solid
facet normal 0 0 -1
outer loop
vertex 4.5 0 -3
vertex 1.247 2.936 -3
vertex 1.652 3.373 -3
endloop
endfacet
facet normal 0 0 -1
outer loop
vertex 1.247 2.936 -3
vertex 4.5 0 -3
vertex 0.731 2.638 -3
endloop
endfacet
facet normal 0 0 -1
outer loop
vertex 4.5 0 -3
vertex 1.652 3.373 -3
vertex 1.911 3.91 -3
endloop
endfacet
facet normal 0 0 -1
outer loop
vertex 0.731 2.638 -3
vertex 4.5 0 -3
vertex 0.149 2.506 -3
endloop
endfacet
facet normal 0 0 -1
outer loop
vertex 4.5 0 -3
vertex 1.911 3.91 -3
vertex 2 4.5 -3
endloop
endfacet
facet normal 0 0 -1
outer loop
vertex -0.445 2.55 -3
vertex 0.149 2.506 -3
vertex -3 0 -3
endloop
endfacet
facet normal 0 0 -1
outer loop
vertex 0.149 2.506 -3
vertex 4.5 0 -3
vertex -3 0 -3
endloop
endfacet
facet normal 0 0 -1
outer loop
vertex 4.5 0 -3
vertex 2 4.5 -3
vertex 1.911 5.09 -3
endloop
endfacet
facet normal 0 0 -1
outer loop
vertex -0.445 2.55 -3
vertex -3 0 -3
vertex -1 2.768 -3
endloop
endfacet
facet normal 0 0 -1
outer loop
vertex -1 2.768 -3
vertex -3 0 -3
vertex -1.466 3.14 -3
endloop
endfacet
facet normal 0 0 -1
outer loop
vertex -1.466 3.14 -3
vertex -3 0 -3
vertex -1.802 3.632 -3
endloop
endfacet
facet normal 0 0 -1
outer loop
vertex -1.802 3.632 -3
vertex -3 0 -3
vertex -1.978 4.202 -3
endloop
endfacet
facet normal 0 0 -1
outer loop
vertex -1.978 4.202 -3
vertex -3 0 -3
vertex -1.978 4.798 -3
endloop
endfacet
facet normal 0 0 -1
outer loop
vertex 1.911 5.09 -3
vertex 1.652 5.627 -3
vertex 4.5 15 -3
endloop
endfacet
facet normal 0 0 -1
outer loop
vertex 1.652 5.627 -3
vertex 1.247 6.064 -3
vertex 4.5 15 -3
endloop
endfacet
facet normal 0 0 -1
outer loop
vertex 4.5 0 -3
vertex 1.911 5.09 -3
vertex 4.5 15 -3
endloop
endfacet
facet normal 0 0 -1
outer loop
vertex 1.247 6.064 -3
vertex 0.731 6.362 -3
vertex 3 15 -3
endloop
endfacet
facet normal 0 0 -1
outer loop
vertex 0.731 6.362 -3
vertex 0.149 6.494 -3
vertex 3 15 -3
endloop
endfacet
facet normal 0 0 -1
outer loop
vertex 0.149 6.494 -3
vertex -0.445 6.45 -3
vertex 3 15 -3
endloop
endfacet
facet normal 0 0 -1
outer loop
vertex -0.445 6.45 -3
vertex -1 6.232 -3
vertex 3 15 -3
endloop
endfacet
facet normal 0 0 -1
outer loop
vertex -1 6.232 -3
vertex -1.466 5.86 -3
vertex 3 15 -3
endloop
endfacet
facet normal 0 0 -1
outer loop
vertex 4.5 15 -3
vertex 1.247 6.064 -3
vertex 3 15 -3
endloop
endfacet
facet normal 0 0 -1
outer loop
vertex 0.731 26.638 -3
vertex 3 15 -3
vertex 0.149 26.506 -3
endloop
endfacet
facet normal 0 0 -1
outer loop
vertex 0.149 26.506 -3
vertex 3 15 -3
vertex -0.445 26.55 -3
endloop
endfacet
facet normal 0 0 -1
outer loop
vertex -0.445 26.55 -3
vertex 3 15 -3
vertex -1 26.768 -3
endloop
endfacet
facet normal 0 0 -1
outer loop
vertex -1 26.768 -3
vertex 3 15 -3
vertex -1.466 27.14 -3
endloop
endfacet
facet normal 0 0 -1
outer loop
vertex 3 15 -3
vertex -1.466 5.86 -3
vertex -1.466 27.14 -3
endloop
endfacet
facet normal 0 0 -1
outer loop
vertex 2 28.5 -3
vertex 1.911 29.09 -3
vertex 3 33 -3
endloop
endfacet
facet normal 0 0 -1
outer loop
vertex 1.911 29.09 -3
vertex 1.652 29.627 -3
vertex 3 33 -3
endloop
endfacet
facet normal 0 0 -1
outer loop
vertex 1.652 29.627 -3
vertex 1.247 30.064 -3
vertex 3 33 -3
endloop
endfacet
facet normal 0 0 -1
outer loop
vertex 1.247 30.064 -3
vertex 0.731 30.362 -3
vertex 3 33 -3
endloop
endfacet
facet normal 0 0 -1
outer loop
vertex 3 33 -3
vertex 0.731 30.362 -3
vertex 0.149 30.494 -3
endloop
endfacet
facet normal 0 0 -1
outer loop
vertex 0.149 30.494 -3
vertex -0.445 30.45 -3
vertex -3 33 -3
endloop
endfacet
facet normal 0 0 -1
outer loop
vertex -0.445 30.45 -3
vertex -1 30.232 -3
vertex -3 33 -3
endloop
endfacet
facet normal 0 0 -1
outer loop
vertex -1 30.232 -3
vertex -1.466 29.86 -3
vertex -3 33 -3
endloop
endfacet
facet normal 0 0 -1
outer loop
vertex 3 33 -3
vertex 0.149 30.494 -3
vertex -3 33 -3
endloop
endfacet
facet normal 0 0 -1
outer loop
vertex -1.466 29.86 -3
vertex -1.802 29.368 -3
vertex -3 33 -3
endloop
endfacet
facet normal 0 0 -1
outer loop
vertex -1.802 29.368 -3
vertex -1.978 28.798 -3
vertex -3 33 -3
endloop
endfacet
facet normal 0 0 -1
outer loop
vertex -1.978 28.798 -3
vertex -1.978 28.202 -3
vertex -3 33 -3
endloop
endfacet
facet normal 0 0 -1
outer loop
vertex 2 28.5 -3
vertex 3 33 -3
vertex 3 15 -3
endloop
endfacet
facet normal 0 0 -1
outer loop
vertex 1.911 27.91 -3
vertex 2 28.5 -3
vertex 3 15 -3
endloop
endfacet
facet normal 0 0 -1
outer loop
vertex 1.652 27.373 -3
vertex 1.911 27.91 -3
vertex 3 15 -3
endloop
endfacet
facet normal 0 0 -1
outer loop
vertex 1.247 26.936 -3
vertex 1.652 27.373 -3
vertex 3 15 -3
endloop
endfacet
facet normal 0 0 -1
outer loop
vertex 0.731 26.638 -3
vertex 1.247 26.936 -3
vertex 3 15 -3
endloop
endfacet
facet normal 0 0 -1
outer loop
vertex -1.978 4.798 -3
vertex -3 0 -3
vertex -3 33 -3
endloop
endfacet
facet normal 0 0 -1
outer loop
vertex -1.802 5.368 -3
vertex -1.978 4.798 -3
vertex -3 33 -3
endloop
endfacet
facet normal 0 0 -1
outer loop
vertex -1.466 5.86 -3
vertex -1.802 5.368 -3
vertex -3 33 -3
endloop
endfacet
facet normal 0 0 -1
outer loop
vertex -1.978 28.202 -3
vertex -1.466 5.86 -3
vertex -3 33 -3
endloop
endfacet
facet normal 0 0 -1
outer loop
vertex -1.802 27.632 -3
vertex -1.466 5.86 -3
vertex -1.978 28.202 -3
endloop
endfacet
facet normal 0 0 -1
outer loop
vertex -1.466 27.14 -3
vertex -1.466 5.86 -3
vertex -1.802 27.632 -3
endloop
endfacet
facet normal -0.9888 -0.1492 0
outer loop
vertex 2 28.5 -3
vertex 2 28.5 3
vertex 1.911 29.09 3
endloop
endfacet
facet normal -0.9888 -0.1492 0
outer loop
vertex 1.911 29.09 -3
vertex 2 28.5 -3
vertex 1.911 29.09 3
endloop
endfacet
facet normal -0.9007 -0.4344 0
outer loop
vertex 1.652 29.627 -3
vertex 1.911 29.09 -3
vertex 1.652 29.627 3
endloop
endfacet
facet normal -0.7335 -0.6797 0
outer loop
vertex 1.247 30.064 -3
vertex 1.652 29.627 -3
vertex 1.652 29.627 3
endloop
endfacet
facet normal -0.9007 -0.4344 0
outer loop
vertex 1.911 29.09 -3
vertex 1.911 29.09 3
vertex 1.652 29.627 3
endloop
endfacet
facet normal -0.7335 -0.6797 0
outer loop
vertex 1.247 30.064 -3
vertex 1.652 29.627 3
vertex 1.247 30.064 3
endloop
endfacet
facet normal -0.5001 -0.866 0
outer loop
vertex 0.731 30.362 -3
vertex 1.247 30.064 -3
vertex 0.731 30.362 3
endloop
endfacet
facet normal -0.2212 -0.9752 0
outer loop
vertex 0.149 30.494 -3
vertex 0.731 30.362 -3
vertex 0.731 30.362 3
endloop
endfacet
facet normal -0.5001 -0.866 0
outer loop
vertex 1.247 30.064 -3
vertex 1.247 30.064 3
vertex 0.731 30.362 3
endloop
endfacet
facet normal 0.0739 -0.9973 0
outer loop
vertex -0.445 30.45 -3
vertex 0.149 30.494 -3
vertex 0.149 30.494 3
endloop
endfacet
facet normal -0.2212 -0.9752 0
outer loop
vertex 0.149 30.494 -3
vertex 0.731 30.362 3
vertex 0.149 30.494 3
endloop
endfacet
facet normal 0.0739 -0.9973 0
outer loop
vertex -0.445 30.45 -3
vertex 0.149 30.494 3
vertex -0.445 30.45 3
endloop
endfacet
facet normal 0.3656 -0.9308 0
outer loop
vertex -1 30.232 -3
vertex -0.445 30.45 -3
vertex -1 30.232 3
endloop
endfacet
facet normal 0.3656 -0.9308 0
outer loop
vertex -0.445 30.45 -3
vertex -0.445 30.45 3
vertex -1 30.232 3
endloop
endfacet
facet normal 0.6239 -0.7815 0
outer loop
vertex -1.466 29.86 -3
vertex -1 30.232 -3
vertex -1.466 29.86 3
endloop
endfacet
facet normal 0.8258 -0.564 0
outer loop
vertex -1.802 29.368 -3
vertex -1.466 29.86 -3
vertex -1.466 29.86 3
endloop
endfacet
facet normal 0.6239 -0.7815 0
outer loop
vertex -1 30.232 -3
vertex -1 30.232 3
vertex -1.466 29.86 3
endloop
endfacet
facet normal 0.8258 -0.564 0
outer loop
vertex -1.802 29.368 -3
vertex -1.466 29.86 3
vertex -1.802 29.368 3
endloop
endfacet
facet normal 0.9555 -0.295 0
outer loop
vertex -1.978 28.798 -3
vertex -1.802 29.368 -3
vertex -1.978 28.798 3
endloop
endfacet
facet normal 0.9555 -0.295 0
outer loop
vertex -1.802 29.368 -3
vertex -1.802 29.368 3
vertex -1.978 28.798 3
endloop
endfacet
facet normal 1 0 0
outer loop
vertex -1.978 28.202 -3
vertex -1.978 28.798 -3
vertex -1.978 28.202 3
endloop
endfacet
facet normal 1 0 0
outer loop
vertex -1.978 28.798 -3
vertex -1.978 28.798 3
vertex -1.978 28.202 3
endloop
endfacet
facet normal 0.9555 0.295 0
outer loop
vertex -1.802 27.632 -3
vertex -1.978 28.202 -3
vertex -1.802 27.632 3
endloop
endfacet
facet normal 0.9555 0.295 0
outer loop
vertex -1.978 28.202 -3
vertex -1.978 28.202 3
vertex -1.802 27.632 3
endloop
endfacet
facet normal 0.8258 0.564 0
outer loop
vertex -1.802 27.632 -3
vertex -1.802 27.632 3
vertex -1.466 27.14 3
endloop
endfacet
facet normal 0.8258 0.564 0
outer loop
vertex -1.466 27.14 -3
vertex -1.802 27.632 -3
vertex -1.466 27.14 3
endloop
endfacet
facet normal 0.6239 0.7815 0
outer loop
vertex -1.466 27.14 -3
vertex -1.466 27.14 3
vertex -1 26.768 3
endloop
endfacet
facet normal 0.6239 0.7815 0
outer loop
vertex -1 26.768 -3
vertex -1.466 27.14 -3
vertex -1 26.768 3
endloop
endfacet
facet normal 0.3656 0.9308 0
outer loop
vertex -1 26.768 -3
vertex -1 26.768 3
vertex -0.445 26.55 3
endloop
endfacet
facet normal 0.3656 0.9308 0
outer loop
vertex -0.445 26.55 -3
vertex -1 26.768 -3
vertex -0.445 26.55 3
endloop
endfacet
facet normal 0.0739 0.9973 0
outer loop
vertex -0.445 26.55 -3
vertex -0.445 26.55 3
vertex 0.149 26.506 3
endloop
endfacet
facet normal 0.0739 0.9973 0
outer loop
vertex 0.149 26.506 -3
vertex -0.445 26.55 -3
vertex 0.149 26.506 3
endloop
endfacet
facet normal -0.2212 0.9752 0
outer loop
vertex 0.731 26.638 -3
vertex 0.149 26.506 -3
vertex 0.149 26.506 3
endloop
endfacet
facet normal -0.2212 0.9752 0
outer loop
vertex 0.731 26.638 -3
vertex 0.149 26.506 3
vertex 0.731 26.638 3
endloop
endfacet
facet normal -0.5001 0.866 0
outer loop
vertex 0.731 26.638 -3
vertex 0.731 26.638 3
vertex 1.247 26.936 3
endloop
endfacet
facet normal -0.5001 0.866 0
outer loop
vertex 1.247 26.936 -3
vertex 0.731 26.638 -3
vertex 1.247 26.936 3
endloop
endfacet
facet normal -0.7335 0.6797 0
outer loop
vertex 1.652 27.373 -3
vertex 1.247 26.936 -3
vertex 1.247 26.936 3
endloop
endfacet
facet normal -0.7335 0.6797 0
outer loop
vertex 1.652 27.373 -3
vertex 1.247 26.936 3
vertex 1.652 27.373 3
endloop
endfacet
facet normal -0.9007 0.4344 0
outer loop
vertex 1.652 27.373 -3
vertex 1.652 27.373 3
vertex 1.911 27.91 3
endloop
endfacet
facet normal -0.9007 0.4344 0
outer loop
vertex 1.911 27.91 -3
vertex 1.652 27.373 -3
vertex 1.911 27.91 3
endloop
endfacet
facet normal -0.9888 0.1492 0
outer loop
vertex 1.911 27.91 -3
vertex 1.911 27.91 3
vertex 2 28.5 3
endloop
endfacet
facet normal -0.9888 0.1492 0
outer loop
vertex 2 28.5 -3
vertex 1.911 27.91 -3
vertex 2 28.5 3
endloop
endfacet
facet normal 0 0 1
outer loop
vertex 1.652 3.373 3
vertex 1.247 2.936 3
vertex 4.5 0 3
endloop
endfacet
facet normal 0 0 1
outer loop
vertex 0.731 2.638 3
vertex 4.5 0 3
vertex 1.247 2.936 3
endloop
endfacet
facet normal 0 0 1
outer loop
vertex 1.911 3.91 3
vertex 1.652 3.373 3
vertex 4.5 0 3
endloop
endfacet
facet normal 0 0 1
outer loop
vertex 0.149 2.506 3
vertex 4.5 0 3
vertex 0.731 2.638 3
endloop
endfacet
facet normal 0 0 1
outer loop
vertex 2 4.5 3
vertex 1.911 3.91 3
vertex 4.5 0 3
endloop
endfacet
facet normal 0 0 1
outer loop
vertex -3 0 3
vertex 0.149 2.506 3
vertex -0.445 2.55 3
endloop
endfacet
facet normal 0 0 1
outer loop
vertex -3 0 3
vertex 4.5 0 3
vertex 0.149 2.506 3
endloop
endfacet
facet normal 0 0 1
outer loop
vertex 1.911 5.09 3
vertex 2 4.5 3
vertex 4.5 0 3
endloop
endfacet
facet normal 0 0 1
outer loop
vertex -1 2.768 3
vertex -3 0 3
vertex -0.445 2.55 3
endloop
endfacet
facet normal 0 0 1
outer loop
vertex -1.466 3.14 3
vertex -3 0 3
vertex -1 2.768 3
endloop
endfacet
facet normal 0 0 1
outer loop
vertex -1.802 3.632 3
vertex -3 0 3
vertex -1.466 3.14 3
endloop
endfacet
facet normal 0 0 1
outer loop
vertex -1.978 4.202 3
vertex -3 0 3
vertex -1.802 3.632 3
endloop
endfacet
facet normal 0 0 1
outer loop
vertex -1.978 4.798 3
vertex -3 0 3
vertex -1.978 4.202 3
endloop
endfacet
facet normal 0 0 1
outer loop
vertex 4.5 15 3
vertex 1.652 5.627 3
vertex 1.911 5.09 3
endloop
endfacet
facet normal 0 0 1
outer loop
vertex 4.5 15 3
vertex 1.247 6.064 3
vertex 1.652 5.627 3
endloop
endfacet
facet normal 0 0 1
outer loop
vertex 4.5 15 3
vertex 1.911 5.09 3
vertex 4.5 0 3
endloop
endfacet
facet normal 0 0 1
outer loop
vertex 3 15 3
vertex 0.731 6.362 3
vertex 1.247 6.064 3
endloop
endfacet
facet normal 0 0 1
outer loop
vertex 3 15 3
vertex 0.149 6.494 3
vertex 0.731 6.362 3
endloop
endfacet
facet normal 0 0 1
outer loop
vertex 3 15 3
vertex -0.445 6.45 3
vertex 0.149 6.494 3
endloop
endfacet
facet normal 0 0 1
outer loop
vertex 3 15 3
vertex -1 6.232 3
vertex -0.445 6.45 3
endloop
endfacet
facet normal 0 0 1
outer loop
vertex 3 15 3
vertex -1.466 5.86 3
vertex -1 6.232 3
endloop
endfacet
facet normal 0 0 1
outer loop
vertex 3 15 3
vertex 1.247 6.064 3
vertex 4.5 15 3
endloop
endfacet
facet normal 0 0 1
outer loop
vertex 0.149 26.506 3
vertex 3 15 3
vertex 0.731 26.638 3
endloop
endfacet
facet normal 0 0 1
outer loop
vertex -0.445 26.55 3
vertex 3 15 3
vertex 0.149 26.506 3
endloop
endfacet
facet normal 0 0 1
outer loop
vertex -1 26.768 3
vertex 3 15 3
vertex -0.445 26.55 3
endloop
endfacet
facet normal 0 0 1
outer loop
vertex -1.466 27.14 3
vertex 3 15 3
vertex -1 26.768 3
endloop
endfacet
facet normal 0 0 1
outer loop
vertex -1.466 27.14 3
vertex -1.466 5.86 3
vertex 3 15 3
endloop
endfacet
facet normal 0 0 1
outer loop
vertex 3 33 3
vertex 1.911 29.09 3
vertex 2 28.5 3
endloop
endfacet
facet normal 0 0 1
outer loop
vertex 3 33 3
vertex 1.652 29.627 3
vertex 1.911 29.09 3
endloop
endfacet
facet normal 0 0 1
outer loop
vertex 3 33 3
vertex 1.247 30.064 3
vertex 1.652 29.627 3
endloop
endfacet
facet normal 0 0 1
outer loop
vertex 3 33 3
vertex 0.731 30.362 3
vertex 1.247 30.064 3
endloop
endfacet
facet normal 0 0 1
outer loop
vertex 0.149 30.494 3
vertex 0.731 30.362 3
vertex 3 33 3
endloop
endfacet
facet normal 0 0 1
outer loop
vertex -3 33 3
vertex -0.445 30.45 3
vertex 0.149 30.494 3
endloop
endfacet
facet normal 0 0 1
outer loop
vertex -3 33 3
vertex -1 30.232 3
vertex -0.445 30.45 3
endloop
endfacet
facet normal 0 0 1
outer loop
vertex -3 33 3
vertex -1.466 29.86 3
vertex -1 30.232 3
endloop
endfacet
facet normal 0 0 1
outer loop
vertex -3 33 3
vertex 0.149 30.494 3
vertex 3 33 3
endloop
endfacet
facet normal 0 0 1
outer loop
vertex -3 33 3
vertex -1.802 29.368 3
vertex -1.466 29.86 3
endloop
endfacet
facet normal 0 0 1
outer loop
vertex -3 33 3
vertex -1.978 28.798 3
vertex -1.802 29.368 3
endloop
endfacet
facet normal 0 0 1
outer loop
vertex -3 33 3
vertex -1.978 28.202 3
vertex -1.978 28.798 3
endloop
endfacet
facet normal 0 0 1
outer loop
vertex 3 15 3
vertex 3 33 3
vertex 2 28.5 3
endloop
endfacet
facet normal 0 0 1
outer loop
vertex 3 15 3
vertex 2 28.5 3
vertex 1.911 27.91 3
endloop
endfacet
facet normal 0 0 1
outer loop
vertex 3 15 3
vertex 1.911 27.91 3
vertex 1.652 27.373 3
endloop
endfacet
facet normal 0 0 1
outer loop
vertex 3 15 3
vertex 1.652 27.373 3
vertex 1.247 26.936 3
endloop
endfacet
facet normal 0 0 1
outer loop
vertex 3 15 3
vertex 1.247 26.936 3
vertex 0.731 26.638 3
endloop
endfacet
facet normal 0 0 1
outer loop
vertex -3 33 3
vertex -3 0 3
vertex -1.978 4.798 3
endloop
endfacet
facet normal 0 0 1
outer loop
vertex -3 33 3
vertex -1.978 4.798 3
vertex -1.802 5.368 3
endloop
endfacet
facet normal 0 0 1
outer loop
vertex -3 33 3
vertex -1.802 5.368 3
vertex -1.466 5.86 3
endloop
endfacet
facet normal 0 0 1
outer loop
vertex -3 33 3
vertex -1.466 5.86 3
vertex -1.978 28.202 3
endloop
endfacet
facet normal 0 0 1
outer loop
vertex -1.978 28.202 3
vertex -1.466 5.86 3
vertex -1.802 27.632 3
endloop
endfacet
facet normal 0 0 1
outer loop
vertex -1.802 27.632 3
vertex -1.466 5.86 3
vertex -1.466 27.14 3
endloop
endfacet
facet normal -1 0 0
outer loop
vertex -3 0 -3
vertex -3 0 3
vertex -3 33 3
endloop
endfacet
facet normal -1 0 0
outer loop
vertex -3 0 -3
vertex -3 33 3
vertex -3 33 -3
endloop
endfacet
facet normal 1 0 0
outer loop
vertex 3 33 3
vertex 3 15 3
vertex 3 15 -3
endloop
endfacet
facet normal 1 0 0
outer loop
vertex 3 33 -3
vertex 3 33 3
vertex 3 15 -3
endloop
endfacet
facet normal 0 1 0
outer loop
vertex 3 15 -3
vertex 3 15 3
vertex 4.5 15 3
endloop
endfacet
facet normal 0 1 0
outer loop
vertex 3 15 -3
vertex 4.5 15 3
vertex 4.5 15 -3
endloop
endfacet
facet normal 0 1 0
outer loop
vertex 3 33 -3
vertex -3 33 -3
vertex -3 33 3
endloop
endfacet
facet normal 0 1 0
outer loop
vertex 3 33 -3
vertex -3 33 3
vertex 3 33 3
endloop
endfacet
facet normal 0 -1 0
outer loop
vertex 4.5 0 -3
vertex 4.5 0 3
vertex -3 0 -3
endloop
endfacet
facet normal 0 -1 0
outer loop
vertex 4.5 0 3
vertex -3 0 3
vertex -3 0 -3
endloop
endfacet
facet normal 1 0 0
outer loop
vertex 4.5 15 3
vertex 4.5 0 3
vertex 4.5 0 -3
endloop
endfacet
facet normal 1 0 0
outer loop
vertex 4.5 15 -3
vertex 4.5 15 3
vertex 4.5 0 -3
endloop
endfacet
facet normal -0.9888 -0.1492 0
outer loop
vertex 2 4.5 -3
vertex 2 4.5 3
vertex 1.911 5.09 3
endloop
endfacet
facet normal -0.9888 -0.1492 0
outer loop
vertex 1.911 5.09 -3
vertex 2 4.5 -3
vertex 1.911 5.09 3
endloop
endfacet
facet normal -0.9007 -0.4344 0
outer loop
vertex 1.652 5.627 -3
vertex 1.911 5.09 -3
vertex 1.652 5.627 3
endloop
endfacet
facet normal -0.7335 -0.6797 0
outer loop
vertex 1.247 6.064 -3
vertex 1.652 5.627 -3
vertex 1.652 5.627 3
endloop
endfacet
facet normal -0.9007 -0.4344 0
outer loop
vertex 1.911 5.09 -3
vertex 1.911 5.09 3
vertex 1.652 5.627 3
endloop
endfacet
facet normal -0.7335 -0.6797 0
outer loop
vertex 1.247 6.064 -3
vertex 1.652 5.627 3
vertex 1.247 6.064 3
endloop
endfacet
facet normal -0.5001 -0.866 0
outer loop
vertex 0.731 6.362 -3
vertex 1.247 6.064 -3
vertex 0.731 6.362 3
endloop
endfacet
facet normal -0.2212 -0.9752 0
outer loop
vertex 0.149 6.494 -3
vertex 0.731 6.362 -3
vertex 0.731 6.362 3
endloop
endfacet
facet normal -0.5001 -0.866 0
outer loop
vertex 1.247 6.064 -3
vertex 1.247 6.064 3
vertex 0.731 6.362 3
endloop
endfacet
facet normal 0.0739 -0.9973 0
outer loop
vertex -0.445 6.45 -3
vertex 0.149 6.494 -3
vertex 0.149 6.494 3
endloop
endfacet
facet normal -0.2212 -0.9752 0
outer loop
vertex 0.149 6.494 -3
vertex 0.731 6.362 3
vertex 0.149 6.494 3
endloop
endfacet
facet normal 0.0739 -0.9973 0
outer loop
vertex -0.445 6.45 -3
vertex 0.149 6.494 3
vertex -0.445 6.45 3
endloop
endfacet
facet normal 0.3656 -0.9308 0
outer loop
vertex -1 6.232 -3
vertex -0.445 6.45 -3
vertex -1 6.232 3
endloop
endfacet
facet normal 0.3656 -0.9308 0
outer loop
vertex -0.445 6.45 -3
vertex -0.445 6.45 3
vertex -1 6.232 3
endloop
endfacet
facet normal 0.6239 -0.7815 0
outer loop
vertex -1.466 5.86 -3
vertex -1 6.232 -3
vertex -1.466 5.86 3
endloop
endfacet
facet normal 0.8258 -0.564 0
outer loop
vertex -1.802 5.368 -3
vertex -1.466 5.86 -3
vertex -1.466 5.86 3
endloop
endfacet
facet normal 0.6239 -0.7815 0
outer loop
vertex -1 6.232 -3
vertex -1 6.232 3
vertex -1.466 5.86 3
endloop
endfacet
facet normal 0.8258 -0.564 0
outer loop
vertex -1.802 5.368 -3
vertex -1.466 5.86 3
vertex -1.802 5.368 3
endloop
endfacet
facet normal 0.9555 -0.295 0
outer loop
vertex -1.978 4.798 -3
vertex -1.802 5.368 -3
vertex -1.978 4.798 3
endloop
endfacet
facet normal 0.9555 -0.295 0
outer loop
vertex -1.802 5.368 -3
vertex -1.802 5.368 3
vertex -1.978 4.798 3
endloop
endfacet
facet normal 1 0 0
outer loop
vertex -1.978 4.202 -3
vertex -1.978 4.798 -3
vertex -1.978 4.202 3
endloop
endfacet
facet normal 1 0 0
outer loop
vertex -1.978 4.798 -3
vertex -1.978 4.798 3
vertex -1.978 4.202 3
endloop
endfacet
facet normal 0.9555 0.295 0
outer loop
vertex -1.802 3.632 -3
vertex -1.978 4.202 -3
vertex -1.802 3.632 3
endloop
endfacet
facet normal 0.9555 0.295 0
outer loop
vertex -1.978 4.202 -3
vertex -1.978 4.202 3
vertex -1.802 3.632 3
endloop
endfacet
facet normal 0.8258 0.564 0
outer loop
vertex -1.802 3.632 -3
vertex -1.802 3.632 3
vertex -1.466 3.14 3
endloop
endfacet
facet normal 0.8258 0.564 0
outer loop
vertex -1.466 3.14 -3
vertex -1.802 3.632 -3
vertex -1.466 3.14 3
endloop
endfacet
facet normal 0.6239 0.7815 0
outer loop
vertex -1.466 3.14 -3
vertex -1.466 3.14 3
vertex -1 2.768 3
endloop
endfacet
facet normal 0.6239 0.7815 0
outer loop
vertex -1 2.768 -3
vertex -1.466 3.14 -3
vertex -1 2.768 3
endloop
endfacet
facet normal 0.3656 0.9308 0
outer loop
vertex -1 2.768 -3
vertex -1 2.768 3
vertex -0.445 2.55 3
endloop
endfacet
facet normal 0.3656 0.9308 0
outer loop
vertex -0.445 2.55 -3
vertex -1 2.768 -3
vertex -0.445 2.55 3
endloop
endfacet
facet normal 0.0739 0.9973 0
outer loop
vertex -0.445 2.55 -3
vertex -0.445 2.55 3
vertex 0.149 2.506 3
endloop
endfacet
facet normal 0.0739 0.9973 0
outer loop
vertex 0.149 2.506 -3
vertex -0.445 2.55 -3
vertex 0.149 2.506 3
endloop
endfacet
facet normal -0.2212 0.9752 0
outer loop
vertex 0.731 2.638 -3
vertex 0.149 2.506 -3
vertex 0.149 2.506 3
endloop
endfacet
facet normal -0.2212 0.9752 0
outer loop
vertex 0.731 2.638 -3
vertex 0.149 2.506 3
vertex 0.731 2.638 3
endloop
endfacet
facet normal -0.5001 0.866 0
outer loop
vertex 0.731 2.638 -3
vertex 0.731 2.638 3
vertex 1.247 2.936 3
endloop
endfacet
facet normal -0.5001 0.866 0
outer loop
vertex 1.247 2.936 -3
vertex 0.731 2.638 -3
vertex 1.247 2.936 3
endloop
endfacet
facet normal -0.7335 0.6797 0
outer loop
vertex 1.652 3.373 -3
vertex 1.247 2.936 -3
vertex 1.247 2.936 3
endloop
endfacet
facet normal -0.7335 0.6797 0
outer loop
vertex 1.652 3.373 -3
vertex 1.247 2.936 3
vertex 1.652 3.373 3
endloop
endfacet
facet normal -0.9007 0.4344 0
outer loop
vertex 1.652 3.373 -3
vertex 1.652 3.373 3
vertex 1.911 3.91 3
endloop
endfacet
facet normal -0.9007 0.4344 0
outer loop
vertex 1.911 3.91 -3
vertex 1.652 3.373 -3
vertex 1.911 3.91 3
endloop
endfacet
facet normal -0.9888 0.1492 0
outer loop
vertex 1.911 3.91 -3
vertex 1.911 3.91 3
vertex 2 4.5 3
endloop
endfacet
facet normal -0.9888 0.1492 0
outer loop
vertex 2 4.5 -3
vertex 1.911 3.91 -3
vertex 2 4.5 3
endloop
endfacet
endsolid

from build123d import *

# Parameters (mm, degrees)
SKETCH1_W           = 6
SKETCH1_H           = 6
BOSS_EXTRUDE1_DEPTH = 33
SKETCH2_R           = 2
CUT_EXTRUDE1_DEPTH  = 33
SKETCH3_W           = 6
SKETCH3_H           = 15
BOSS_EXTRUDE2_DEPTH = 1.5


with BuildPart() as part:
    # Sketch1 → Boss-Extrude1 (new body)
    with BuildSketch(Plane(origin=(0, 0, 0), x_dir=(1, 0, 0), z_dir=(0, 1, 0))):
        Rectangle(SKETCH1_W, SKETCH1_H)
    extrude(amount=BOSS_EXTRUDE1_DEPTH)

    # Sketch2 → Cut-Extrude1 (cut)
    with BuildSketch(Plane.XY.offset(3)):
        with Locations((0, 28.5)):
            Circle(SKETCH2_R)
        with Locations((0, 4.5)):
            Circle(SKETCH2_R)
    extrude(amount=-CUT_EXTRUDE1_DEPTH, mode=Mode.SUBTRACT)

    # Sketch3 → Boss-Extrude2 (add)
    with BuildSketch(Plane(origin=(3, 0, 0), x_dir=(0, 0, -1), z_dir=(1, 0, 0))):
        with Locations((0, 7.5)):
            Rectangle(SKETCH3_W, SKETCH3_H)
    extrude(amount=BOSS_EXTRUDE2_DEPTH)


solid = part.part
